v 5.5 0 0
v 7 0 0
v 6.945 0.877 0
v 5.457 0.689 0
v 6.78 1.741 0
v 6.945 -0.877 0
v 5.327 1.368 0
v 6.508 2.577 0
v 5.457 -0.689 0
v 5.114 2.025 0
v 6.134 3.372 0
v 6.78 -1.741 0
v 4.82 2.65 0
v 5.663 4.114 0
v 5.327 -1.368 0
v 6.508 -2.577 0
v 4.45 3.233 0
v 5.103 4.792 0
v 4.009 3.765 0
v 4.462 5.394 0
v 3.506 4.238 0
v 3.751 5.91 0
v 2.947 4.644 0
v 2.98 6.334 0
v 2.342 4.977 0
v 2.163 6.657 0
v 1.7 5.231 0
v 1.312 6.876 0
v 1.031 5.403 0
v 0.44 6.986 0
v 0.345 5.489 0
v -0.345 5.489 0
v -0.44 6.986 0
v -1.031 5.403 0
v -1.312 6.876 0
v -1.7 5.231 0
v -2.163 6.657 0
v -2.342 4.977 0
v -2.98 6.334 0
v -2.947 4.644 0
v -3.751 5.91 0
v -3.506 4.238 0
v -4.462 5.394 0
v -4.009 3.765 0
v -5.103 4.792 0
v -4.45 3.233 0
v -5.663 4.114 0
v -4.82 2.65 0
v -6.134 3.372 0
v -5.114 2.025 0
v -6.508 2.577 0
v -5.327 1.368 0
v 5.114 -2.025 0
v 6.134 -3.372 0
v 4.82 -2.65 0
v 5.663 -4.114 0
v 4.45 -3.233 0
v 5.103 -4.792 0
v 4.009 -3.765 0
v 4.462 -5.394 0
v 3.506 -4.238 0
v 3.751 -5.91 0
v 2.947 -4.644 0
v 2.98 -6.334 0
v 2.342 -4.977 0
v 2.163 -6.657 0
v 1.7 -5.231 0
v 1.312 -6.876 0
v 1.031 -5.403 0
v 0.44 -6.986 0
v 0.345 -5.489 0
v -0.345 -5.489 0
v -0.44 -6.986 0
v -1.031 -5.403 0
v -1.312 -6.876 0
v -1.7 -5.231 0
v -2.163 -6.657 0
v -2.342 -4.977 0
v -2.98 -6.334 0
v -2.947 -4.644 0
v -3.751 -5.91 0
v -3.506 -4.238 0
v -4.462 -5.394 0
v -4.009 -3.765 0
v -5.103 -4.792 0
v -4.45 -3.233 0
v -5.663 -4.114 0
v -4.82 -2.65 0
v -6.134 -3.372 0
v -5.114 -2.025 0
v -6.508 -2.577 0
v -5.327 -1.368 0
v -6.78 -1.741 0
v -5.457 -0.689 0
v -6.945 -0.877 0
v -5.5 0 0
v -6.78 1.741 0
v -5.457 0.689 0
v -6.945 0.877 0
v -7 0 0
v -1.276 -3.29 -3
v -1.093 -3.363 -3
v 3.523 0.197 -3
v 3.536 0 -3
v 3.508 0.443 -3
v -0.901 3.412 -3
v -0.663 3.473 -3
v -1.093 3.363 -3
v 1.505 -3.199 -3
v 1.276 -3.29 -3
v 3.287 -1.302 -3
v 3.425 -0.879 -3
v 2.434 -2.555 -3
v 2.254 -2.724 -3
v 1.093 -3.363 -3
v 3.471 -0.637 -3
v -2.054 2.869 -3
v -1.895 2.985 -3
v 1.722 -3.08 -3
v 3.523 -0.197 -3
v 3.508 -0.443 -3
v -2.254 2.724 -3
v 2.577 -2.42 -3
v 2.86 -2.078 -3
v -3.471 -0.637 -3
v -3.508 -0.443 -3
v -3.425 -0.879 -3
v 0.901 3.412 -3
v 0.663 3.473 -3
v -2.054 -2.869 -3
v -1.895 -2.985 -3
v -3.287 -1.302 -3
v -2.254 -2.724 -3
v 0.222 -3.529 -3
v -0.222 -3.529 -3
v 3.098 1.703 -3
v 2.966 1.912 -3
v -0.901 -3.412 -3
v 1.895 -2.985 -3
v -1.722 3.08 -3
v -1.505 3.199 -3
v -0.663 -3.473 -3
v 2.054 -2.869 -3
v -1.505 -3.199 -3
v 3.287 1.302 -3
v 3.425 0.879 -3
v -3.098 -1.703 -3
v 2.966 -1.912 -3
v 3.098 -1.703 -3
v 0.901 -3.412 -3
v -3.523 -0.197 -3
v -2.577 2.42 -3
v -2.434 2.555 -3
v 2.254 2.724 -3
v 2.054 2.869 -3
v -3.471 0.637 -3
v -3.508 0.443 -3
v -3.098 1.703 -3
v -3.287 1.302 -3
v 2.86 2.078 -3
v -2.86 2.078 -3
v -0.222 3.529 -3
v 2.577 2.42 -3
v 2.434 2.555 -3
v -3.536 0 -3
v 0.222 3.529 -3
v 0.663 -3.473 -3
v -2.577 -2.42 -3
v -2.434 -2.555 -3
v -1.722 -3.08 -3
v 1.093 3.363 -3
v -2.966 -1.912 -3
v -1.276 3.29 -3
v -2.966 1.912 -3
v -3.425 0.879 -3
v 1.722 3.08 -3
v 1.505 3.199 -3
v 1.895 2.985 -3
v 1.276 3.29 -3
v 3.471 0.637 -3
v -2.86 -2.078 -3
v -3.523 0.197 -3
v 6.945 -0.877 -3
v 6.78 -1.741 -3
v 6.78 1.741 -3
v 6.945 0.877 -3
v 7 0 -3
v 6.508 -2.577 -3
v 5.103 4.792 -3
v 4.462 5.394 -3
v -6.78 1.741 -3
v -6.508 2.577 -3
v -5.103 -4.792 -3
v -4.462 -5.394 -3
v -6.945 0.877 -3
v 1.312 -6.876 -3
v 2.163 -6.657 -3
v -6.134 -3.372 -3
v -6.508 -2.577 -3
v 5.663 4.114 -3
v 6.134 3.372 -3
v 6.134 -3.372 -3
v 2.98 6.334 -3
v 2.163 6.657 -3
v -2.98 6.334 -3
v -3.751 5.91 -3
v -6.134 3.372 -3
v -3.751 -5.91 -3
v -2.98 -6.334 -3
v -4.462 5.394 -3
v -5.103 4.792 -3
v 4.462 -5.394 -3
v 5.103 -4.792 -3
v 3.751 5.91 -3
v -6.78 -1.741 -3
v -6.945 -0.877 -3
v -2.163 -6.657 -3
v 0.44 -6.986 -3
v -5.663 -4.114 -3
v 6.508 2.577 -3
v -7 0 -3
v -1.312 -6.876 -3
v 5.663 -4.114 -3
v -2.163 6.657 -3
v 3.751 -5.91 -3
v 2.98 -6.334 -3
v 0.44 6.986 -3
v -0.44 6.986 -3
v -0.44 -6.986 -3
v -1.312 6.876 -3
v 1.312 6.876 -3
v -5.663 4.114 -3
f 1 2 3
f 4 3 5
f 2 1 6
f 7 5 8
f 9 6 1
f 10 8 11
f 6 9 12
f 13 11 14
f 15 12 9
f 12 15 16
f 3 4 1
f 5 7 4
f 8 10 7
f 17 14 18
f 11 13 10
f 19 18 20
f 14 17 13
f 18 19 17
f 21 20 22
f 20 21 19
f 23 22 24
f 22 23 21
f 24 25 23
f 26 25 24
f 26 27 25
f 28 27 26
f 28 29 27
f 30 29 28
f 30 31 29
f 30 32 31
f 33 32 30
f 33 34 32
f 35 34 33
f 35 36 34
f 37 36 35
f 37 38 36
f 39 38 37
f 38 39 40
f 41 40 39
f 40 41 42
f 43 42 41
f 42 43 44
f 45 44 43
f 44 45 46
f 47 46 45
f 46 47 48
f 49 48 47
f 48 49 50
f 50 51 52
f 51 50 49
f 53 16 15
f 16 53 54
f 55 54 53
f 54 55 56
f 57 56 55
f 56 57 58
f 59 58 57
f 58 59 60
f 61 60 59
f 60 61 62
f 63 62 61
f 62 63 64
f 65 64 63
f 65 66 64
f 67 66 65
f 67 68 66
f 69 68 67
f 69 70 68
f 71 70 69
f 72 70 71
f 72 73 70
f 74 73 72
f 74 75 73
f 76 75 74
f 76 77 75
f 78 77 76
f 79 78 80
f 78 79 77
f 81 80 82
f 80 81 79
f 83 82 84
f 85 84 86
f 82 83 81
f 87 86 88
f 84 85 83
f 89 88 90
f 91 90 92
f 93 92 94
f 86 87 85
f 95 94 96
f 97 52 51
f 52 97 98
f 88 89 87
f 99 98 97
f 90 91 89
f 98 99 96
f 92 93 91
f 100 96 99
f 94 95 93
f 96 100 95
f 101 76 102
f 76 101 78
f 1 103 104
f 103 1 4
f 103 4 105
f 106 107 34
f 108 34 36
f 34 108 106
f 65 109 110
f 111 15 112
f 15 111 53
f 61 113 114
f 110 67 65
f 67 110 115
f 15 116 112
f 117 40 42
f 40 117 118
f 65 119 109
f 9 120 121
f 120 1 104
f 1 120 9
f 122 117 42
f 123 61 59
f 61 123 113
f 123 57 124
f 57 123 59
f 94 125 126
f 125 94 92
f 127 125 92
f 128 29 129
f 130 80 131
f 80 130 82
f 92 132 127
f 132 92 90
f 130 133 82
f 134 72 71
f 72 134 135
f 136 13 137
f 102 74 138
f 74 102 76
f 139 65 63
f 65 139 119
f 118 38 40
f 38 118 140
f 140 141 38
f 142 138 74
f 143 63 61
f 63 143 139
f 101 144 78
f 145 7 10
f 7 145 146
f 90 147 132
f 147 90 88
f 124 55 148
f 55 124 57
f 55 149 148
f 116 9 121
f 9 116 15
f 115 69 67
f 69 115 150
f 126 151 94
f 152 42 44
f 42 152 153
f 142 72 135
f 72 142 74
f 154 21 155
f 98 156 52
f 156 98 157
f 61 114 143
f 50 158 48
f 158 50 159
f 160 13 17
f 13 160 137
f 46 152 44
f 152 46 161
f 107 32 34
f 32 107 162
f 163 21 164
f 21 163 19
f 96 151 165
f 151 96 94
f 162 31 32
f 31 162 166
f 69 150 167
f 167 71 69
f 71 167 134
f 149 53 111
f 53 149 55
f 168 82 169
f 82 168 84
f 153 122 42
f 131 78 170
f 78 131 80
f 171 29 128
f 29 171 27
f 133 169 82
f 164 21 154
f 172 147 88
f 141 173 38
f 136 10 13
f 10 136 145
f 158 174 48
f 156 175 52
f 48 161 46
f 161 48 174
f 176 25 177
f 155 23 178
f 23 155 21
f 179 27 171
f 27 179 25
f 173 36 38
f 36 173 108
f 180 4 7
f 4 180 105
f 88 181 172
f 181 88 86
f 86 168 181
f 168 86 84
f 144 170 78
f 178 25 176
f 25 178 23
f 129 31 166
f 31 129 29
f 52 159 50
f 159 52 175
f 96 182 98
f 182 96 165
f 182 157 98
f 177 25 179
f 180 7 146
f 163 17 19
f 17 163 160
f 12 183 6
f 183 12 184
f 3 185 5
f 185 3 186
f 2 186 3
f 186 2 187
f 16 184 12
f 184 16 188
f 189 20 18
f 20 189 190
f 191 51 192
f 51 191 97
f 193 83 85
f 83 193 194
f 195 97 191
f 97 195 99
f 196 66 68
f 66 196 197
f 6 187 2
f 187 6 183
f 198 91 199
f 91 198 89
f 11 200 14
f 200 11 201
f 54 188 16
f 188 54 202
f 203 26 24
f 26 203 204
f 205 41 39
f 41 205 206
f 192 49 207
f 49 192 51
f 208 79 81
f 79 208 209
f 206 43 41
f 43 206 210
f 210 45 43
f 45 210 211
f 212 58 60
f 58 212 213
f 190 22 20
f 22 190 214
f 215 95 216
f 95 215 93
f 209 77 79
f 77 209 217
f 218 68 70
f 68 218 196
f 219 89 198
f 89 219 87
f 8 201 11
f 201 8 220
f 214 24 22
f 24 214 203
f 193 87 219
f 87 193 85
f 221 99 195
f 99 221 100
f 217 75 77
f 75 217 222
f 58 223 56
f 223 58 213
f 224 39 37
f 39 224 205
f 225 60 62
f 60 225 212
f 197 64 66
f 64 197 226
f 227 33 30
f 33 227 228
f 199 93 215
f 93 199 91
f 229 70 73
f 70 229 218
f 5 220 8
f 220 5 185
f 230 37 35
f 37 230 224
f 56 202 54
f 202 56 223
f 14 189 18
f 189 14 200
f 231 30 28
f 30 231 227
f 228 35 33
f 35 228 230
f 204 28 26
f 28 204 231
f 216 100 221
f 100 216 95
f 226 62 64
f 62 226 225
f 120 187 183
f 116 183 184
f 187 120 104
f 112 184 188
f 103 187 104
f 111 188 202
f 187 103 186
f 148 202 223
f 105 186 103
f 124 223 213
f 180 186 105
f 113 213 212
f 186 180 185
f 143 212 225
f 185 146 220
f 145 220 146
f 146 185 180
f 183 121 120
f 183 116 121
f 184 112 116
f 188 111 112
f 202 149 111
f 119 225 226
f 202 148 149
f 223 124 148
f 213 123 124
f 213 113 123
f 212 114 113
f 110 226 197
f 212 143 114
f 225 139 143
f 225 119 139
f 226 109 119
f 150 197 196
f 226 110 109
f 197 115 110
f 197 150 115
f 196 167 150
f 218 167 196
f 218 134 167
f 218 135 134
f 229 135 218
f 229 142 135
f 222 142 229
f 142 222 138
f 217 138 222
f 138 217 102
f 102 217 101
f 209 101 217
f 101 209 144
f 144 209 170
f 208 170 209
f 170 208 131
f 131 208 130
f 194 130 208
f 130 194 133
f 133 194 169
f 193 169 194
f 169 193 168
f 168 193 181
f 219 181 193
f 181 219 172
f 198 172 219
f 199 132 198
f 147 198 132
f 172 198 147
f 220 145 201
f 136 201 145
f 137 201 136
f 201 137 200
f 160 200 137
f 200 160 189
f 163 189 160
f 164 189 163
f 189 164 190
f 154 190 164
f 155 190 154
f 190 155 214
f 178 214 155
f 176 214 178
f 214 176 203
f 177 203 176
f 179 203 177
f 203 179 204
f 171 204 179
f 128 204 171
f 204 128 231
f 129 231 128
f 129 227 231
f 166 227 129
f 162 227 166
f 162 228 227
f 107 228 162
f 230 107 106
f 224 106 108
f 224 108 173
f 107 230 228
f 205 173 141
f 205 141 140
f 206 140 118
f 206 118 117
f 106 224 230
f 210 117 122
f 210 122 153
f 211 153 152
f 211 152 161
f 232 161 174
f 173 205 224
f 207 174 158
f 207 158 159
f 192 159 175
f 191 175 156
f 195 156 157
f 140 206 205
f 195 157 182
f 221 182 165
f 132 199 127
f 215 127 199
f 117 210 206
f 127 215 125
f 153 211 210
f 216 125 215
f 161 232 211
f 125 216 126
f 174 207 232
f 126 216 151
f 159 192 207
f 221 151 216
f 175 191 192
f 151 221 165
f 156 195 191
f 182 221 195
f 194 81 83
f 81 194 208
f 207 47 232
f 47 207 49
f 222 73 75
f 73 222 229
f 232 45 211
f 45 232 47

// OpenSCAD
$fn = 50;


difference() {
	union() {
		translate(v = [0, 0, -3.0000000000]) {
			cylinder(h = 3, r = 7.0000000000);
		}
		cylinder(h = 0, r = 17.0000000000);
	}
	union() {
		translate(v = [0, 0, 0]) {
			rotate(a = [0, 0, 0]) {
				difference() {
					union() {
						#translate(v = [0, 0, -3.0000000000]) {
							cylinder(h = 3, r = 2.2500000000);
						}
						#translate(v = [0, 0, -4.2000000000]) {
							cylinder(h = 4.2000000000, r1 = 2.7500000000, r2 = 5.5000000000);
						}
						#translate(v = [0, 0, -3.0000000000]) {
							cylinder(h = 3, r = 2.7500000000);
						}
						#translate(v = [0, 0, -3.0000000000]) {
							cylinder(h = 3, r = 2.2500000000);
						}
					}
					union();
				}
			}
		}
	}
}
